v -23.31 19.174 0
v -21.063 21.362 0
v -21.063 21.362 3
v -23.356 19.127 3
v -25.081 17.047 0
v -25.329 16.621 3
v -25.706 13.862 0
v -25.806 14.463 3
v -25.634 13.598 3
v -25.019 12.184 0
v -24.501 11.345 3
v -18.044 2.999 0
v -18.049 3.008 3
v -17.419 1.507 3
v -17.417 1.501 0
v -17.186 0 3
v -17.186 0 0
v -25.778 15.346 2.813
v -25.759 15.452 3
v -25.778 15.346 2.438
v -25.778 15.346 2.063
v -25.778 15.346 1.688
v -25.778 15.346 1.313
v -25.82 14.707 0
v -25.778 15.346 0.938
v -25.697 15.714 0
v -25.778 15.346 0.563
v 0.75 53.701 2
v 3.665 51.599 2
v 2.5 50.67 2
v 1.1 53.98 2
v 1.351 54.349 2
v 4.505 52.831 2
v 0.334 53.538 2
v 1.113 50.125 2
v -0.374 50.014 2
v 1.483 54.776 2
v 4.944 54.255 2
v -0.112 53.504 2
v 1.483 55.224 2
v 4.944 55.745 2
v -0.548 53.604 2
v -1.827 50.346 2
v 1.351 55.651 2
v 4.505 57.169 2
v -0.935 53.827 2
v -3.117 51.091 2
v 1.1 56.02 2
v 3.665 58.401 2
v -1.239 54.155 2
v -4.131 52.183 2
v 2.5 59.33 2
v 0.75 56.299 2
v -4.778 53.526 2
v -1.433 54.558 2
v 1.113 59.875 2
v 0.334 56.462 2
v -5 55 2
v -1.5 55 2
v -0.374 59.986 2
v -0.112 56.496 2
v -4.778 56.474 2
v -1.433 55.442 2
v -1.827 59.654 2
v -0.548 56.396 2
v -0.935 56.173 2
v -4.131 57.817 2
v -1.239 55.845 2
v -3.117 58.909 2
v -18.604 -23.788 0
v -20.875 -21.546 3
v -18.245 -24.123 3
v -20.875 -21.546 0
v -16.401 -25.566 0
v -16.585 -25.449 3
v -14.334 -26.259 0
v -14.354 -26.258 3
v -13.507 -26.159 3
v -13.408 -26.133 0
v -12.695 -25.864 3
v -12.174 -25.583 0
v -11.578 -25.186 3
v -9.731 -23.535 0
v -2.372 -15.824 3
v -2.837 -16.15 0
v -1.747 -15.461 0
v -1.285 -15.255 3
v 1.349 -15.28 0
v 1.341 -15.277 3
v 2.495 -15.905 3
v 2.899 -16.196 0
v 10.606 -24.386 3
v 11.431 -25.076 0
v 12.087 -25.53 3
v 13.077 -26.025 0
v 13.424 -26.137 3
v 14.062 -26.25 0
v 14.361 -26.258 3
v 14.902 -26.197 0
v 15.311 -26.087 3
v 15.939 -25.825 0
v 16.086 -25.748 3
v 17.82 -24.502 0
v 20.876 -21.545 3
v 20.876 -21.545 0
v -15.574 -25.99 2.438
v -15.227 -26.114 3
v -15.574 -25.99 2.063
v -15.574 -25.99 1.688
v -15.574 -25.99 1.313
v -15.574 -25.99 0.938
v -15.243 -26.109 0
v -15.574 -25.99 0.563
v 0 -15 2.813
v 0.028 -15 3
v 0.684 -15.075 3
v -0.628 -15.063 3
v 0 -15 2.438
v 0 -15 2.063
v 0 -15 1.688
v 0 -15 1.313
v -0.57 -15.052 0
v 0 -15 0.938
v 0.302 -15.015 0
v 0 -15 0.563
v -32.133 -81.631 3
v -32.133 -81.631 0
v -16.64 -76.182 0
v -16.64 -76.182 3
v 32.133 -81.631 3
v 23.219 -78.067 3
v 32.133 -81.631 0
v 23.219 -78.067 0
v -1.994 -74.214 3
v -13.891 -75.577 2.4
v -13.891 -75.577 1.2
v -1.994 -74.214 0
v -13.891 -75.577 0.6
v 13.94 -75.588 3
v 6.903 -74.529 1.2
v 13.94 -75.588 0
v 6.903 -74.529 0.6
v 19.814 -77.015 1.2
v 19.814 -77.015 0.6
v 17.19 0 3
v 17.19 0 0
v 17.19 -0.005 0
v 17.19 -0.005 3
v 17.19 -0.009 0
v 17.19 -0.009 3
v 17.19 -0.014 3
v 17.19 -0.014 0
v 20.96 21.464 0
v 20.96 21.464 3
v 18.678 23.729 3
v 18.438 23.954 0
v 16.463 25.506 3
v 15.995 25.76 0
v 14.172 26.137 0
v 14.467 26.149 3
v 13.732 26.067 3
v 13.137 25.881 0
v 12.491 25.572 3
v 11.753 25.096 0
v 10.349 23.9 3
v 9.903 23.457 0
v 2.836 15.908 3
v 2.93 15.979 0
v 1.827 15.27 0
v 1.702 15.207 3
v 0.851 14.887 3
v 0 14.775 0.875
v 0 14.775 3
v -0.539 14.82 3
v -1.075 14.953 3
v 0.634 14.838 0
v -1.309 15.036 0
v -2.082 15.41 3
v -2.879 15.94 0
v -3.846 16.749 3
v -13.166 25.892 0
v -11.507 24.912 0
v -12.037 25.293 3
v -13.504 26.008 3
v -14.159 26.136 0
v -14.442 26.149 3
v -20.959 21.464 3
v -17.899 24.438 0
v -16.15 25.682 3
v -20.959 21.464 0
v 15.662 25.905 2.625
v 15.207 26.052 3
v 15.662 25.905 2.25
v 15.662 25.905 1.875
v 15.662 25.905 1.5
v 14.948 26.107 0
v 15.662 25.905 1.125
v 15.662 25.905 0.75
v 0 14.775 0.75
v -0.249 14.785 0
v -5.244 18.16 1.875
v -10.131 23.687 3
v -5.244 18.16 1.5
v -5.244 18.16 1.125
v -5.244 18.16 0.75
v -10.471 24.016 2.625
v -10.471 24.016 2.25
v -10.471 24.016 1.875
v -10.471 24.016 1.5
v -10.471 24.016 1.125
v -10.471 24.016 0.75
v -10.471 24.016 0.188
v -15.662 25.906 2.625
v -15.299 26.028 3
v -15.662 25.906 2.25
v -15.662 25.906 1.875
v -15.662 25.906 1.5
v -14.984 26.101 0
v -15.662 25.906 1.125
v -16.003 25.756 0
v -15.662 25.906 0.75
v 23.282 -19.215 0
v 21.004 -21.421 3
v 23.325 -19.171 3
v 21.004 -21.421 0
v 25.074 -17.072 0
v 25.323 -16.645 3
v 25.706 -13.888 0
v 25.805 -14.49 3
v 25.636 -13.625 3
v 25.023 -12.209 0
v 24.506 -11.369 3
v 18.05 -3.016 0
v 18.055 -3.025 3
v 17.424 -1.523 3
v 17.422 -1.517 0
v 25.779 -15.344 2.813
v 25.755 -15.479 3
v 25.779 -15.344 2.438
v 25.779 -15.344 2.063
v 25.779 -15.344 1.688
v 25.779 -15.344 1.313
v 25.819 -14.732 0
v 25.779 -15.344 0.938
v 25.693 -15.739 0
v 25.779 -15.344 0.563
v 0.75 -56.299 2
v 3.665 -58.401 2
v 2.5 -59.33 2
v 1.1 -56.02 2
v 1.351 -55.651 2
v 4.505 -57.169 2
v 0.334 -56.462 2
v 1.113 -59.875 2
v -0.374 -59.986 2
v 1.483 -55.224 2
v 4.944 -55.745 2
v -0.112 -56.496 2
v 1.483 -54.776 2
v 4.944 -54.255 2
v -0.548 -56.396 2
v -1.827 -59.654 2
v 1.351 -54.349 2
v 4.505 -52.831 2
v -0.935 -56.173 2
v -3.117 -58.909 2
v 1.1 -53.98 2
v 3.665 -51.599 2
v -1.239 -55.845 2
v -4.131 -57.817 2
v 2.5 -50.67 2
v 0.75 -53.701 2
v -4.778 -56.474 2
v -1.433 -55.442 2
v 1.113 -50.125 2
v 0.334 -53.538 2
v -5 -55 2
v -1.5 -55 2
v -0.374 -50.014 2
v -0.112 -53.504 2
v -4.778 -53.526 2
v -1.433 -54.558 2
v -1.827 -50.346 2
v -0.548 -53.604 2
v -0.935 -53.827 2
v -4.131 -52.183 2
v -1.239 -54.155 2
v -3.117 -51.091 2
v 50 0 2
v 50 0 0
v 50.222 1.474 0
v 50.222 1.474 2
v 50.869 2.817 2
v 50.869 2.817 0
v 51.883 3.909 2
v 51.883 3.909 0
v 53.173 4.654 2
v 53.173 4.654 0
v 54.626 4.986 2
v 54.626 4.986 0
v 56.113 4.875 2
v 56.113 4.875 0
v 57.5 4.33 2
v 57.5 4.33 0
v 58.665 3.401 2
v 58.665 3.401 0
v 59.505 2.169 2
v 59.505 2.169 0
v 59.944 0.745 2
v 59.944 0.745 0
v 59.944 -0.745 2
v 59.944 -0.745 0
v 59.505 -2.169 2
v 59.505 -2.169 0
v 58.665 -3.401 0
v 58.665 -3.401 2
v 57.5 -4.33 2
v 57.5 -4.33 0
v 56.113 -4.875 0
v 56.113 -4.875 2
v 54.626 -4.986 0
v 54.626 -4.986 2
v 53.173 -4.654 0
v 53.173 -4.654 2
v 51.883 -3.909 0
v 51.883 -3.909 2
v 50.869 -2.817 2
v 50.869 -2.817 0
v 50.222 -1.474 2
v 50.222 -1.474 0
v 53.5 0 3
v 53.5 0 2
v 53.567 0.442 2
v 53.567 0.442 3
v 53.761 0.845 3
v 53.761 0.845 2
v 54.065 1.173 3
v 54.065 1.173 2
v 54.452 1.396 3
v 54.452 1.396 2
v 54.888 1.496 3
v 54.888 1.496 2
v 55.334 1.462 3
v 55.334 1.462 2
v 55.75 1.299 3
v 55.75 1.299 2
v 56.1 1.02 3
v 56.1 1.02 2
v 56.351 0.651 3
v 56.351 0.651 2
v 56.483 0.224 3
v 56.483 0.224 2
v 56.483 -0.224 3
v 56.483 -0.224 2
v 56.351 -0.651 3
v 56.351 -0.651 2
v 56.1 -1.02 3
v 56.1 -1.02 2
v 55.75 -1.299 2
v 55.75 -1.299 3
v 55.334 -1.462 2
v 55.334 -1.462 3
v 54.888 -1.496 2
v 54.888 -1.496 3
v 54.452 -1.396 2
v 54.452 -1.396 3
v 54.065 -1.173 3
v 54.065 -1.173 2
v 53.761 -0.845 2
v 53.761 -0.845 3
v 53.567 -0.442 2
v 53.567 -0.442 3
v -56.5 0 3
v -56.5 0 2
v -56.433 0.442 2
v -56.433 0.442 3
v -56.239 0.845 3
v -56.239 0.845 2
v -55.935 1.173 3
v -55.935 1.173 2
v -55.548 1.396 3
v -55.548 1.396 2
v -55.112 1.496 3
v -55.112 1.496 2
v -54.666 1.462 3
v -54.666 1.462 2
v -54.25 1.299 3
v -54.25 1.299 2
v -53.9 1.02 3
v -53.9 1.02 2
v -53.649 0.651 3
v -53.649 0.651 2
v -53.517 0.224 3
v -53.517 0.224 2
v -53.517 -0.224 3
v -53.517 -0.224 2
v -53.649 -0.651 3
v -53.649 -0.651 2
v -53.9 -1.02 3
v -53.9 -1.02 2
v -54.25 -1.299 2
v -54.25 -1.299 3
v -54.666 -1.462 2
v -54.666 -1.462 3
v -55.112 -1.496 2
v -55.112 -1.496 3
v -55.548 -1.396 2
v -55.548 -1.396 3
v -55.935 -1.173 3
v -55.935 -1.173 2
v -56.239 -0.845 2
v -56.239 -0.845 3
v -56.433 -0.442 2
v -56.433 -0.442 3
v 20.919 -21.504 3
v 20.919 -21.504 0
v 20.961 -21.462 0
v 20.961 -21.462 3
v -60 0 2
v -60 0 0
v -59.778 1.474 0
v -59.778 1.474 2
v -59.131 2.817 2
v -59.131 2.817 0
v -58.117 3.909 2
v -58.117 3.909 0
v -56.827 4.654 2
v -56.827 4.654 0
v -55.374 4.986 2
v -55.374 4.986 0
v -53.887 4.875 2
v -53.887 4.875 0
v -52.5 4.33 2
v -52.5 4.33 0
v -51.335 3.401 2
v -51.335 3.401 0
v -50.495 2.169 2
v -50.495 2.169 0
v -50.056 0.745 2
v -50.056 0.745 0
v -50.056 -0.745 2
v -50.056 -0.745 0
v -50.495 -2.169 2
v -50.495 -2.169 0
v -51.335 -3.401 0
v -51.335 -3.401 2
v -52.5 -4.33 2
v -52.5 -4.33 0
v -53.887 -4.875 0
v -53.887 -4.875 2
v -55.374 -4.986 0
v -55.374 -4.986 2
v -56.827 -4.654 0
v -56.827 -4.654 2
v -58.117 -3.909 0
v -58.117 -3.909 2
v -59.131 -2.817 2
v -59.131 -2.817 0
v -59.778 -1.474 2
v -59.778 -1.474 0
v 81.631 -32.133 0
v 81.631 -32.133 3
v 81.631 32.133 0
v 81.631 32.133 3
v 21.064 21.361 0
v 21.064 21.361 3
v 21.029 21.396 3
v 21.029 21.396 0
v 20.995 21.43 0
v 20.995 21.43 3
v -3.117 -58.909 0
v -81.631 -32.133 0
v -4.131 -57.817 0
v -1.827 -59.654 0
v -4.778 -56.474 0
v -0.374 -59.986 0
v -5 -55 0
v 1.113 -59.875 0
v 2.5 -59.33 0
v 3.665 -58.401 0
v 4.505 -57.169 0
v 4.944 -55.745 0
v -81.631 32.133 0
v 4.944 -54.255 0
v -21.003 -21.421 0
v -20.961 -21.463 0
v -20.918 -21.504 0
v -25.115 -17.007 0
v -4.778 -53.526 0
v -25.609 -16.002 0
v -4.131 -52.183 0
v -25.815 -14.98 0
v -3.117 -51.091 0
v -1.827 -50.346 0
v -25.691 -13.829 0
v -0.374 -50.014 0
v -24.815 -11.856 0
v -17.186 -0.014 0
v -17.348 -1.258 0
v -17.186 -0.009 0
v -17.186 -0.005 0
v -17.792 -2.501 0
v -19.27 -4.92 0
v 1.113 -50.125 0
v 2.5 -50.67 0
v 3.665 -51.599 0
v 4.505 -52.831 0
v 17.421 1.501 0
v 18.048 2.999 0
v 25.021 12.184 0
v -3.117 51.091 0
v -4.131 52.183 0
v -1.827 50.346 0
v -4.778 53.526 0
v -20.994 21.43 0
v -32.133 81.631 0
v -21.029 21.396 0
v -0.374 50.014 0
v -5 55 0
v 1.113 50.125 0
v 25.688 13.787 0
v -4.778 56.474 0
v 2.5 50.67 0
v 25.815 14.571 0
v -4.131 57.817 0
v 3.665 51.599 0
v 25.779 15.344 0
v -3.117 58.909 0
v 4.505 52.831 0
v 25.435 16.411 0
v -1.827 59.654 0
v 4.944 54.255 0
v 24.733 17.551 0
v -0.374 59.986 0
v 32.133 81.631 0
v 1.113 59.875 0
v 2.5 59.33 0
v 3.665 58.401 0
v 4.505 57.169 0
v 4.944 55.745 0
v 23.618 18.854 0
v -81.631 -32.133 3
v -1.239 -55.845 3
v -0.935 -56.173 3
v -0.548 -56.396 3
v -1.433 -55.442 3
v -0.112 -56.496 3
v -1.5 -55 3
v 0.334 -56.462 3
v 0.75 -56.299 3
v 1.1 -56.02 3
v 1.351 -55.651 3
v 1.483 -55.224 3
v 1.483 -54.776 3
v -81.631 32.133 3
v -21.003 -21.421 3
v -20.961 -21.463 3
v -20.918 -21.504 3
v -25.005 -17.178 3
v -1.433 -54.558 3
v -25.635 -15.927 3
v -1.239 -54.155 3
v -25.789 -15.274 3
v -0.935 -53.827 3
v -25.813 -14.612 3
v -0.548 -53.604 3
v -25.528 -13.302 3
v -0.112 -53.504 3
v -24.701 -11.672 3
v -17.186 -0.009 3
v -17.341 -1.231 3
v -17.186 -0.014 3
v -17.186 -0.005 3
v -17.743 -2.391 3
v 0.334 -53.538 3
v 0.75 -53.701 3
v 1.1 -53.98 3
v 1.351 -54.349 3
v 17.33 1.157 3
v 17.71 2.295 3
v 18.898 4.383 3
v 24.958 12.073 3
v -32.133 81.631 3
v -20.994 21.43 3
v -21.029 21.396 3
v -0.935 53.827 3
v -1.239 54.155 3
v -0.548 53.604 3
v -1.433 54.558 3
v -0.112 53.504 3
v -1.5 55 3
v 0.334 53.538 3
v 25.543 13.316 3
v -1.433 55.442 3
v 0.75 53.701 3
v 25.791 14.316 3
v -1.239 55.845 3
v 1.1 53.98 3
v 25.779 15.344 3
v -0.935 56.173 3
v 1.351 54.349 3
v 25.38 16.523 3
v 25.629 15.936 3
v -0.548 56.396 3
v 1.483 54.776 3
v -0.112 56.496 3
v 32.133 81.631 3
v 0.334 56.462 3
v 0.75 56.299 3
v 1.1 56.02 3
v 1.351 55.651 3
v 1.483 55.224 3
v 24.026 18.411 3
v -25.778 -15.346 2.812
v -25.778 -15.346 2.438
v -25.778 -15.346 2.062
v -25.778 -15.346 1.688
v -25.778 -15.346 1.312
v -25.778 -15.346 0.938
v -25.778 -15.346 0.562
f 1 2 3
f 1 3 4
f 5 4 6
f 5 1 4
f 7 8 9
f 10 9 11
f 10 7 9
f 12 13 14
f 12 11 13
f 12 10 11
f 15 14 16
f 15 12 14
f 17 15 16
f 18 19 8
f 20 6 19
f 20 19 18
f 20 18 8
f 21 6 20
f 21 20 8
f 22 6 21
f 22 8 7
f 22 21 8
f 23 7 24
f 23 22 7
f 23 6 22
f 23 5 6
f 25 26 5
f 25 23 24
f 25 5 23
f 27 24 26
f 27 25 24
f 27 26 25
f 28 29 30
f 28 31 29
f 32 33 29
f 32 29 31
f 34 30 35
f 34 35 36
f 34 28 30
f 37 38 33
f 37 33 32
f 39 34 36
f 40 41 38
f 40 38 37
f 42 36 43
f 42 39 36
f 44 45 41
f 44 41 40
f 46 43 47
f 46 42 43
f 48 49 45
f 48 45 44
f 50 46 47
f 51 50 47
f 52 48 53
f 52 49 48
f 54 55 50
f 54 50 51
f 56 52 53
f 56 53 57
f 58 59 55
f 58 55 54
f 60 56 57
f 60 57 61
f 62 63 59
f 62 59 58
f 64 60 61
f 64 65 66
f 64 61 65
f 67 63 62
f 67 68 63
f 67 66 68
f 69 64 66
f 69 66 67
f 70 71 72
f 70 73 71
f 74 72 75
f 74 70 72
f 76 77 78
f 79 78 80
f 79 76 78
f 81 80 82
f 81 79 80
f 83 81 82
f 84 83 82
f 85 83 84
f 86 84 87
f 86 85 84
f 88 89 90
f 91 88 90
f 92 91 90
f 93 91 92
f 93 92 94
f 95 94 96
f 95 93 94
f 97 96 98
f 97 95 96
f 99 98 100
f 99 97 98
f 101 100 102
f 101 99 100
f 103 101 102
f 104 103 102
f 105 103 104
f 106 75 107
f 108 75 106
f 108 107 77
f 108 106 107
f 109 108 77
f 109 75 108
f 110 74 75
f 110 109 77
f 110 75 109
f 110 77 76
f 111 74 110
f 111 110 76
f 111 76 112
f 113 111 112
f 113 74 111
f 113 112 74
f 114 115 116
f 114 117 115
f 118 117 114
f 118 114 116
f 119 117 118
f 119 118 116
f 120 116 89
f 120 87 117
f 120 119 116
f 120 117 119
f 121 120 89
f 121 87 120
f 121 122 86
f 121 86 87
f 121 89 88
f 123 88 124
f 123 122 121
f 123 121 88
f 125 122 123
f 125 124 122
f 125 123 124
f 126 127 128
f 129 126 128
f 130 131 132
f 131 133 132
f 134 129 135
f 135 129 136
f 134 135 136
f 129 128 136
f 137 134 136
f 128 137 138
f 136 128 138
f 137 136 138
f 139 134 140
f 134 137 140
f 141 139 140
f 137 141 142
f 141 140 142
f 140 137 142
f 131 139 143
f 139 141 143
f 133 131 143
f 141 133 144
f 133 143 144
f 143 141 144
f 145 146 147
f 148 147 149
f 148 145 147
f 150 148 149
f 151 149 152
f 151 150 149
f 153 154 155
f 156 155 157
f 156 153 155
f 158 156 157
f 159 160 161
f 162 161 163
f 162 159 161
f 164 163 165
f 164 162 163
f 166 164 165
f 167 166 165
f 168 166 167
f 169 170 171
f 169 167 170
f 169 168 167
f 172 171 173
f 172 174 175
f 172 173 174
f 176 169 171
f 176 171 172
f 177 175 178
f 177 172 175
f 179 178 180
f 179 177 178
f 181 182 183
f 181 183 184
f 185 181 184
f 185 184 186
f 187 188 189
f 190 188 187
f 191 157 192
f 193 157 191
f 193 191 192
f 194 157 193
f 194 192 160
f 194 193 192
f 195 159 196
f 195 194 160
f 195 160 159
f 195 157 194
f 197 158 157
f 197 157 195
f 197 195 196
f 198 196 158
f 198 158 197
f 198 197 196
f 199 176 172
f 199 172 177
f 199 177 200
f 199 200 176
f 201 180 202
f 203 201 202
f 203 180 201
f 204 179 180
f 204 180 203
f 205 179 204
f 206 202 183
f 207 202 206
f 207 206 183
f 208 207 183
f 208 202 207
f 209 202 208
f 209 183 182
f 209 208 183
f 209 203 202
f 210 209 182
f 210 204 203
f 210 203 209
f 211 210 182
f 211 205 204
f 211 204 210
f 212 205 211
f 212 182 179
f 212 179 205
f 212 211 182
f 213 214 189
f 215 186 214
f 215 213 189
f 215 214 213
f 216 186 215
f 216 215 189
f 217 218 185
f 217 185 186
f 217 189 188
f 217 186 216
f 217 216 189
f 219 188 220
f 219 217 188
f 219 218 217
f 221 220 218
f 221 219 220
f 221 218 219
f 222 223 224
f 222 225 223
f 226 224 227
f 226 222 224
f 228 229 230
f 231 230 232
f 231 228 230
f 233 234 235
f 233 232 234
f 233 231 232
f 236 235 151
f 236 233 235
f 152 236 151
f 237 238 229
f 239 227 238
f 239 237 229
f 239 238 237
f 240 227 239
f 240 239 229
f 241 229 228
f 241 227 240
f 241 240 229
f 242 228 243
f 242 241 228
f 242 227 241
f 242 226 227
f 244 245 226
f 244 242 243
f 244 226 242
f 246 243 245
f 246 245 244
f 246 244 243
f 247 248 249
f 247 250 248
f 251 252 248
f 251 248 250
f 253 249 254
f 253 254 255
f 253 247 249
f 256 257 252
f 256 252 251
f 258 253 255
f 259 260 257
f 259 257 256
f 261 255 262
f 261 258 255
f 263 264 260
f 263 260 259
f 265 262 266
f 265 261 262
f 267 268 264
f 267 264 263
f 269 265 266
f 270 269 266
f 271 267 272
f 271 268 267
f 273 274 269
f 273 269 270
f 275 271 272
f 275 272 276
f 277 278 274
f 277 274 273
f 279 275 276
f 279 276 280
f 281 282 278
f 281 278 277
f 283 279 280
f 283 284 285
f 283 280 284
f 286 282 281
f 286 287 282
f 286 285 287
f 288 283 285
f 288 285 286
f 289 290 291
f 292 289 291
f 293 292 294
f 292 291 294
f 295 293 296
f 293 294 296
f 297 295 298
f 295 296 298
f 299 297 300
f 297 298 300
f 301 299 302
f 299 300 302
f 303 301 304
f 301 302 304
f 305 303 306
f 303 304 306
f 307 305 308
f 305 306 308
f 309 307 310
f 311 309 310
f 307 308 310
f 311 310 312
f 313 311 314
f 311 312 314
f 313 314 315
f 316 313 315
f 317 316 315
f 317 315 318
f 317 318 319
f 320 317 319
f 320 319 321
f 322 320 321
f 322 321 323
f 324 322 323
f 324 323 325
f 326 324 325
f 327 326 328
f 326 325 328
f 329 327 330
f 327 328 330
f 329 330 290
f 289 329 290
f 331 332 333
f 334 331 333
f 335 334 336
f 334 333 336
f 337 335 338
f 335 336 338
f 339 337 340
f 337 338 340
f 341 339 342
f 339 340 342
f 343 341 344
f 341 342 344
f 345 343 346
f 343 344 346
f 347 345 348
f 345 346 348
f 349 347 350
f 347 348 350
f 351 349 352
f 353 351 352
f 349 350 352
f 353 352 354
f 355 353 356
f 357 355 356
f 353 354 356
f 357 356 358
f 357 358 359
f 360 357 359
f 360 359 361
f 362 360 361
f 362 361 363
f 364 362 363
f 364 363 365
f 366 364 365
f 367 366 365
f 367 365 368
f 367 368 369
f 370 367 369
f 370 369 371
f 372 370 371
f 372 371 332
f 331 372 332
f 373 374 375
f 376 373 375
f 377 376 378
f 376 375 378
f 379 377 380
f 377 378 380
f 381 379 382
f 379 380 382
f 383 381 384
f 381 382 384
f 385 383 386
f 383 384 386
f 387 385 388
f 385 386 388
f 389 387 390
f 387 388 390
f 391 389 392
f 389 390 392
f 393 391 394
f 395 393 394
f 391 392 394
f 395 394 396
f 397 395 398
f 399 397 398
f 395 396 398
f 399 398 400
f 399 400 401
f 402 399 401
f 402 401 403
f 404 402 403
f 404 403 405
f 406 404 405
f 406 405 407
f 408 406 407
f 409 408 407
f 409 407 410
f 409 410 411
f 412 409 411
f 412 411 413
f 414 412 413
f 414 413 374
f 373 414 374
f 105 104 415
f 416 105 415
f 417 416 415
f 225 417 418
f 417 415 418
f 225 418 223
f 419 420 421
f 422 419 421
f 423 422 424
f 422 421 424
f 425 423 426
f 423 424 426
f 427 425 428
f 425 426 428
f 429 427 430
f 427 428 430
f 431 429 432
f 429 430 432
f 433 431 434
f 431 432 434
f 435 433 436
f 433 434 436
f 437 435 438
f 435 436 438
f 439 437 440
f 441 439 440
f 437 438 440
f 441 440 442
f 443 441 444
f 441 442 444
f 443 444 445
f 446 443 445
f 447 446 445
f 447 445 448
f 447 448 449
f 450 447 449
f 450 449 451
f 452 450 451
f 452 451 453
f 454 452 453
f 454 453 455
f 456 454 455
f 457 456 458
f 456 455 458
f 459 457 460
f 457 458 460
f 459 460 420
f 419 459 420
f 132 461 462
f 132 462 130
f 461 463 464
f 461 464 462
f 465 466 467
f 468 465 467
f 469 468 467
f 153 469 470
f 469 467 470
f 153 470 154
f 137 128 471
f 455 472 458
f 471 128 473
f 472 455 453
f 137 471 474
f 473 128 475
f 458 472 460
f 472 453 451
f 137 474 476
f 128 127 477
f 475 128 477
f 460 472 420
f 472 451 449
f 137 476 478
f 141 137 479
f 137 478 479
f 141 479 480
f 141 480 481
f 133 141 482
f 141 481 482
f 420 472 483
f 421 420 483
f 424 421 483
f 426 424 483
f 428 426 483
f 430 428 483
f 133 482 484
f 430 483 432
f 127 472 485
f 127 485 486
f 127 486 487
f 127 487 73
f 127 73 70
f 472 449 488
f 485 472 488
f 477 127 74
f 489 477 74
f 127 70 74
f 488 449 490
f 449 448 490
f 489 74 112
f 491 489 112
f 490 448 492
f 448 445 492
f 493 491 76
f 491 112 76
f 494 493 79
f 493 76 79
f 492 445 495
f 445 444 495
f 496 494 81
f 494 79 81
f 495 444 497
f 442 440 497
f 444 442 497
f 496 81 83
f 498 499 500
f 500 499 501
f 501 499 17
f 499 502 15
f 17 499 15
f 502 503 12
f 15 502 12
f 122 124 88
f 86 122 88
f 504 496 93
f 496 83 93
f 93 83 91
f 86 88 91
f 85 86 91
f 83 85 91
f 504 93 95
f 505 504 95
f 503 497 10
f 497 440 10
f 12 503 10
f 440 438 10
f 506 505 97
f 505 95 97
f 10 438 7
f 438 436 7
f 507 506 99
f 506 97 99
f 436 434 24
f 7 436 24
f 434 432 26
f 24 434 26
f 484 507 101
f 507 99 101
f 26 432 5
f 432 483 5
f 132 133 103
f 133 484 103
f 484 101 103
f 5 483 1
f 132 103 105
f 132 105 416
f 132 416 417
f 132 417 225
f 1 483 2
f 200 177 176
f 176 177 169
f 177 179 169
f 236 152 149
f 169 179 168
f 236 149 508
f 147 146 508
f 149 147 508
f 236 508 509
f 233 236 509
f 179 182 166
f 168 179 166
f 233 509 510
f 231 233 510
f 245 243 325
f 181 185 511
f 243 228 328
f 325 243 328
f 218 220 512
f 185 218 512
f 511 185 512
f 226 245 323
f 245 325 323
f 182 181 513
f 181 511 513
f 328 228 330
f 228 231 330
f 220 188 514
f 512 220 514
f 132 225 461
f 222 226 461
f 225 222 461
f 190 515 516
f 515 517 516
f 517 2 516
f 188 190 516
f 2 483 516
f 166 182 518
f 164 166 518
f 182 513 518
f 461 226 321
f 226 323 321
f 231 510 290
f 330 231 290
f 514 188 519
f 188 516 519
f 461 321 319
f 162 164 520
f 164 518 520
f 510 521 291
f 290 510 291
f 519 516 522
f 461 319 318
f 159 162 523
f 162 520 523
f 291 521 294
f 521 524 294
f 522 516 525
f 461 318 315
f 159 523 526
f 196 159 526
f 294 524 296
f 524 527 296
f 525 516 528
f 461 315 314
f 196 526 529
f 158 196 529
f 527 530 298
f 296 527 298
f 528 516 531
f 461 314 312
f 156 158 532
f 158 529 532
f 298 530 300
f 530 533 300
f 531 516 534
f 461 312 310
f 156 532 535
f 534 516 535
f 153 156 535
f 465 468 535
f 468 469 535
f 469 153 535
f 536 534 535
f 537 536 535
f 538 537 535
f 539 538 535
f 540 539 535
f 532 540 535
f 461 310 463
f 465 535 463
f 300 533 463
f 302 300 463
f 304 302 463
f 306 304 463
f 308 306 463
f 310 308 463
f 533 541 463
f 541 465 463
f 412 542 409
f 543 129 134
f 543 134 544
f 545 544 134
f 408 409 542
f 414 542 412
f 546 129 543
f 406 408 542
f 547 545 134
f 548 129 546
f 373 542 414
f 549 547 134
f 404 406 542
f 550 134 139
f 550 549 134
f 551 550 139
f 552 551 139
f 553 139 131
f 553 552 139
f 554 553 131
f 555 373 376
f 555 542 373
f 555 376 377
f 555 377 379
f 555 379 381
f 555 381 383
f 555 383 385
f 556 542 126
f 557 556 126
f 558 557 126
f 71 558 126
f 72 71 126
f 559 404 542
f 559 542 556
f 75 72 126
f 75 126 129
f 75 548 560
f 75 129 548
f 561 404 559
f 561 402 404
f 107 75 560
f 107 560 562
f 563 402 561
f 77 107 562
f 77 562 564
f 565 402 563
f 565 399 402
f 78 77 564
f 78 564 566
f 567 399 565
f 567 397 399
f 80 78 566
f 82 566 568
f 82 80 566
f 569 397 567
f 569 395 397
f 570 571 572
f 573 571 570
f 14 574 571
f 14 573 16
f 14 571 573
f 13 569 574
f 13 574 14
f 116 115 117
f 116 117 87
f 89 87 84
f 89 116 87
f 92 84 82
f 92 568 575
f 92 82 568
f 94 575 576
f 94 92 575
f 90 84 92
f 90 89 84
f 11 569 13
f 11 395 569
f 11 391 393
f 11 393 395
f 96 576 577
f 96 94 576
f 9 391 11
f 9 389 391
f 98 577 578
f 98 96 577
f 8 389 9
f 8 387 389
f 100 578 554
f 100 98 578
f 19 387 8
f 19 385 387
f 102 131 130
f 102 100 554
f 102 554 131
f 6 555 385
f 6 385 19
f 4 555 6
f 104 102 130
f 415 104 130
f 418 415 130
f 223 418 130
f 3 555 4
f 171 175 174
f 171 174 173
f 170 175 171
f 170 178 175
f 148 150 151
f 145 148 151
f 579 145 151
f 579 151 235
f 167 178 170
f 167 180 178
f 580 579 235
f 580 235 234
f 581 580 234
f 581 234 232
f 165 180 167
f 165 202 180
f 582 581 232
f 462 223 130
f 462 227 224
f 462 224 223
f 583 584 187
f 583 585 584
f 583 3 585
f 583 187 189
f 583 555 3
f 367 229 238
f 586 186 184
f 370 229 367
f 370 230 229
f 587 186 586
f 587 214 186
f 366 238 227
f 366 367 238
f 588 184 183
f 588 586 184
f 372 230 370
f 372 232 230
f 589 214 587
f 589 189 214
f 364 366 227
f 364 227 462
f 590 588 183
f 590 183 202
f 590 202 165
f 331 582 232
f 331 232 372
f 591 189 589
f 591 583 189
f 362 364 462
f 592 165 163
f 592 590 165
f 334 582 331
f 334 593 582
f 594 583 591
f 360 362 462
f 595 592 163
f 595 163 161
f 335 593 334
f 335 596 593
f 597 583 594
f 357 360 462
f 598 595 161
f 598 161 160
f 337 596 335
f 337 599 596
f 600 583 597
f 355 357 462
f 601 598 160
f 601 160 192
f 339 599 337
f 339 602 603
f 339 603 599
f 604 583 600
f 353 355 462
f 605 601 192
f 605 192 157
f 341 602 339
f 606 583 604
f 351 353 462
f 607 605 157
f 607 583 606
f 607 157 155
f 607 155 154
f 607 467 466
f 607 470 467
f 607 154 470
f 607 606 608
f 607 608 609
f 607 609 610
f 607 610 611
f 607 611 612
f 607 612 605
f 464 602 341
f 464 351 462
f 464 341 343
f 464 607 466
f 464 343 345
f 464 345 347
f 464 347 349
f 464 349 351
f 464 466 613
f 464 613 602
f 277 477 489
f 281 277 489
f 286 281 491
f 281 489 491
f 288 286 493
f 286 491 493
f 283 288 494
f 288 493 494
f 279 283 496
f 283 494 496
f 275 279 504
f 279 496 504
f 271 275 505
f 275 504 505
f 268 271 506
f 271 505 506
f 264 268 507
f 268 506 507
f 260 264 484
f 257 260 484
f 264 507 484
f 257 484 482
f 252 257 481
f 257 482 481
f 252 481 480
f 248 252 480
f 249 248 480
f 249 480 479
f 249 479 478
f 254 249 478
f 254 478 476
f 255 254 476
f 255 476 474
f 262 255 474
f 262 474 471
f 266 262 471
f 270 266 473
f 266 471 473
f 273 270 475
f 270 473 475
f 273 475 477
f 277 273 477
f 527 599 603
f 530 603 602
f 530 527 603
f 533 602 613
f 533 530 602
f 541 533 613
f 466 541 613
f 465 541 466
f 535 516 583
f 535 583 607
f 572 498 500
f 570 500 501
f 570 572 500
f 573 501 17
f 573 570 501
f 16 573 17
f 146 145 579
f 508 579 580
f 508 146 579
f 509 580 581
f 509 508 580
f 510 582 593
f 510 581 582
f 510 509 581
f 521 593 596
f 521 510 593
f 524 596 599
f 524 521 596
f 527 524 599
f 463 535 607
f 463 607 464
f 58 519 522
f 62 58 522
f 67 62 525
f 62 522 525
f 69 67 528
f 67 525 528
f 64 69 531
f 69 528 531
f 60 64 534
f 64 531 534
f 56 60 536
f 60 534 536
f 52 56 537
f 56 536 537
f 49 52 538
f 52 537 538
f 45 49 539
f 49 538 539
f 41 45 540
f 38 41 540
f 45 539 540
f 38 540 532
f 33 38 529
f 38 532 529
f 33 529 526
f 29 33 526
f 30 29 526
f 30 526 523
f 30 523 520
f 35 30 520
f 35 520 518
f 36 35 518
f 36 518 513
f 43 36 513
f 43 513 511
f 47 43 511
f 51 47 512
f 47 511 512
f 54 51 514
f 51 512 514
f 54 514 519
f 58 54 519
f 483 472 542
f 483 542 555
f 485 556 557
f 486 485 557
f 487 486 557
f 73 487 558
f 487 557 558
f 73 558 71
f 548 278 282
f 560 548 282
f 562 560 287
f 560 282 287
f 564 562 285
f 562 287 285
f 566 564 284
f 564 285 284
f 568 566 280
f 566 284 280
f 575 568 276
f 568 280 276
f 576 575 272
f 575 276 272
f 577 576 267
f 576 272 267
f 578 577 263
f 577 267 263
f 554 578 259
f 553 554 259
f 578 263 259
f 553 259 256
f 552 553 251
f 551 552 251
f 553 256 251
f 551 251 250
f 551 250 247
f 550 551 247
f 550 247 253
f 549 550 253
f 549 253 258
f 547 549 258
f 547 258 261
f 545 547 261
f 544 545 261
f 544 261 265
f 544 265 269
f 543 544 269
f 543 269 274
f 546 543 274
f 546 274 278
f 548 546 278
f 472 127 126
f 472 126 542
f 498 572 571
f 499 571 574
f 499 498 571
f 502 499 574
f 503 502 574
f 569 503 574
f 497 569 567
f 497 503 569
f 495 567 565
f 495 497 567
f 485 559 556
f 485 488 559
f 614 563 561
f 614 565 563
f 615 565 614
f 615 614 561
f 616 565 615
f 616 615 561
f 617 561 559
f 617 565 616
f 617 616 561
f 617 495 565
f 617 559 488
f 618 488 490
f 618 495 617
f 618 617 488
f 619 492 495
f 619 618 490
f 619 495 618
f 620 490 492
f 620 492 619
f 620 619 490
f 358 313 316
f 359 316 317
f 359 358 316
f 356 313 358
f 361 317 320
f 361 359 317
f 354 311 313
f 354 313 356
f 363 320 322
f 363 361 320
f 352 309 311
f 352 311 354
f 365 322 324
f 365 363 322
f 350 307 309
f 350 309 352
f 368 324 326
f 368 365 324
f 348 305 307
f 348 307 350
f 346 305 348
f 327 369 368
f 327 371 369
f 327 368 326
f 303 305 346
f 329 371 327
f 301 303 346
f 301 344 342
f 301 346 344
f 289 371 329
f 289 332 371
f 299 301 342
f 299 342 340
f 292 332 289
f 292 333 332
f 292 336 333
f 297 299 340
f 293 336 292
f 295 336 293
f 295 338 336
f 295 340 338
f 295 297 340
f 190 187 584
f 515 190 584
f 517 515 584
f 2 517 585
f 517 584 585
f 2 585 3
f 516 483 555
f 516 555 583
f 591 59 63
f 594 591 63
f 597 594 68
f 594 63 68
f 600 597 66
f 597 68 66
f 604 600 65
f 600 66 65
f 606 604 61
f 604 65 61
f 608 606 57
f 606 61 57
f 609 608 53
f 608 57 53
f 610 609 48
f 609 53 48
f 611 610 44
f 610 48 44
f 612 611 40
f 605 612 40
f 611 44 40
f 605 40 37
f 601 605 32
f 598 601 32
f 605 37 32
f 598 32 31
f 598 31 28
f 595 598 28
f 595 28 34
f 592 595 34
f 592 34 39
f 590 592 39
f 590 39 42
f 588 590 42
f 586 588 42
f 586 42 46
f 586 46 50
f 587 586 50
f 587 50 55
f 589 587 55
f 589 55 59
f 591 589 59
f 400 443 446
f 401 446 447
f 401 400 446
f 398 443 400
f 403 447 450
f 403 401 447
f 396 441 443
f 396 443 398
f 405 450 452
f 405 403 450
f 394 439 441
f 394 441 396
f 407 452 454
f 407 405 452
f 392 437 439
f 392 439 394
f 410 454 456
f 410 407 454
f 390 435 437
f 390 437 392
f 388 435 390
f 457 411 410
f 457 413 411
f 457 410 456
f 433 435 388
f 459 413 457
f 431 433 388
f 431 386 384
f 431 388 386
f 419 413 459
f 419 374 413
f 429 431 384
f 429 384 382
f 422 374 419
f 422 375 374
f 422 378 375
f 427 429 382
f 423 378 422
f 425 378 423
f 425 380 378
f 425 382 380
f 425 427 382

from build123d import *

# Parameters (mm, degrees)
BOSS_EXTRUDE1_DEPTH  = 3
SKETCH2_R            = 1.5
CUT_EXTRUDE1_DEPTH   = 3
SKETCH3_R            = 30
SKETCH3_R_2          = 15
CUT_EXTRUDE2_DEPTH   = 3
SKETCH4_R            = 18
BOSS_EXTRUDE6_DEPTH  = 3
SKETCH5_R            = 15
BOSS_EXTRUDE7_DEPTH  = 3
SKETCH6_R            = 15.225419419
BOSS_EXTRUDE8_DEPTH  = 3
SKETCH7_R            = 1.5
CUT_EXTRUDE4_DEPTH   = 3
SKETCH9_R            = 10
CUT_EXTRUDE5_DEPTH   = 3
SKETCH10_R           = 19.155501788
BOSS_EXTRUDE9_DEPTH  = 3
SKETCH11_R           = 13.756788871
BOSS_EXTRUDE10_DEPTH = 3
SKETCH12_R           = 11.549228796
BOSS_EXTRUDE11_DEPTH = 3
SKETCH14_R           = 9.610550559
BOSS_EXTRUDE12_DEPTH = 3
SKETCH15_R           = 14.086691916
BOSS_EXTRUDE13_DEPTH = 3
SKETCH16_R           = 15.543730799
BOSS_EXTRUDE14_DEPTH = 3
SKETCH17_R           = 14.681473261
BOSS_EXTRUDE17_DEPTH = 3
SKETCH18_R           = 13.614072274
BOSS_EXTRUDE18_DEPTH = 3
SKETCH19_R           = 1.5
CUT_EXTRUDE6_DEPTH   = 10
SKETCH20_R           = 5
CUT_EXTRUDE8_DEPTH   = 2
CUT_EXTRUDE11_DEPTH  = 14


with BuildPart() as part:
    # Sketch1 → Boss-Extrude1 (new body)
    with BuildSketch(Plane.XY):
        with BuildLine():
            Line((-32.133468612, 81.630943295), (32.133468612, 81.630943295))
            Line((32.133468612, 81.630943295), (81.630943295, 32.133468612))
            Line((81.630943295, 32.133468612), (81.630943295, -32.133468612))
            Line((81.630943295, -32.133468612), (32.133468612, -81.630943295))
            add(Edge.make_bspline(
                [(-32.133468612, -81.630943295), (-26.315604905, -78.929469601), (-17.458466972, -75.90692924), (-6.459846686, -74.366971031), (0.503945588, -74.095540146), (13.381410653, -74.737409183), (24.194527132, -77.919288079), (32.133468612, -81.630943295)],
                knots=[0, 0, 0, 0, 0.289771888, 0.418866631, 0.500125988, 0.604148798, 1, 1, 1, 1], degree=3))
            Line((-32.133468612, -81.630943295), (-81.630943295, -32.133468612))
            Line((-81.630943295, -32.133468612), (-81.630943295, 32.133468612))
            Line((-81.630943295, 32.133468612), (-32.133468612, 81.630943295))
        make_face()
    extrude(amount=BOSS_EXTRUDE1_DEPTH)

    # Sketch2 → Cut-Extrude1 (cut)
    with BuildSketch(Plane.XY.offset(3)):
        with Locations((-39.204536424, -39.204536424)):
            Circle(SKETCH2_R)
        with Locations((39.204536424, -39.204536424)):
            Circle(SKETCH2_R)
        with Locations((39.204536424, 39.204536424)):
            Circle(SKETCH2_R)
        with Locations((-39.204536424, 39.204536424)):
            Circle(SKETCH2_R)
    extrude(amount=-CUT_EXTRUDE1_DEPTH, mode=Mode.SUBTRACT)

    # Sketch3 → Cut-Extrude2 (cut)
    with BuildSketch(Plane.XY.offset(3)):
        Circle(SKETCH3_R)
        with Locations((0, 30)):
            Circle(SKETCH3_R_2)
        Circle(SKETCH3_R)
        with Locations((0, 30)):
            Circle(SKETCH3_R_2)
        with Locations((0, -30)):
            Circle(SKETCH3_R_2)
        Circle(SKETCH3_R)
        with Locations((30, 0)):
            Circle(SKETCH3_R_2)
        with Locations((0, 30)):
            Circle(SKETCH3_R_2)
        with Locations((-30, 0)):
            Circle(SKETCH3_R_2)
        Circle(SKETCH3_R)
        with Locations((-30, 0)):
            Circle(SKETCH3_R_2)
        Circle(SKETCH3_R)
        with Locations((0, -30)):
            Circle(SKETCH3_R_2)
        Circle(SKETCH3_R)
        with Locations((30, 0)):
            Circle(SKETCH3_R_2)
        Circle(SKETCH3_R)
        with Locations((30, 0)):
            Circle(SKETCH3_R_2)
        Circle(SKETCH3_R)
        with Locations((0, -30)):
            Circle(SKETCH3_R_2)
        Circle(SKETCH3_R)
        with Locations((-30, 0)):
            Circle(SKETCH3_R_2)
    extrude(amount=-CUT_EXTRUDE2_DEPTH, mode=Mode.SUBTRACT)

    # Sketch4 → Boss-Extrude6 (add)
    with BuildSketch(Plane.XY.offset(3)):
        with Locations((-35.186247216, 0)):
            Circle(SKETCH4_R)
        with Locations((35.19, 0)):
            Circle(SKETCH4_R)
    extrude(amount=-BOSS_EXTRUDE6_DEPTH)

    # Sketch5 → Boss-Extrude7 (add)
    with BuildSketch(Plane.XY.offset(3)):
        with Locations((0, -30)):
            Circle(SKETCH5_R)
    extrude(amount=-BOSS_EXTRUDE7_DEPTH)

    # Sketch6 → Boss-Extrude8 (add)
    with BuildSketch(Plane.XY.offset(3)):
        with Locations((0, 30)):
            Circle(SKETCH6_R)
    extrude(amount=-BOSS_EXTRUDE8_DEPTH)

    # Sketch7 → Cut-Extrude4 (cut)
    with BuildSketch(Plane.XY.offset(3)):
        with Locations((-46.253324199, 32.134700114)):
            Circle(SKETCH7_R)
        with Locations((-52.103605786, -20.865299886)):
            Circle(SKETCH7_R)
        with Locations((34.896394214, -20.865299886)):
            Circle(SKETCH7_R)
        with Locations((34.896394214, 32.134700114)):
            Circle(SKETCH7_R)
    extrude(amount=-CUT_EXTRUDE4_DEPTH, mode=Mode.SUBTRACT)

    # Sketch9 → Cut-Extrude5 (cut)
    with BuildSketch(Plane.XY.offset(3)):
        with Locations((0, 65.004511024)):
            Circle(SKETCH9_R)
        with Locations((0, -51.773637368)):
            Circle(SKETCH9_R)
        with Locations((-62.186247216, 0)):
            Circle(SKETCH9_R)
        with Locations((62.19, 0)):
            Circle(SKETCH9_R)
    extrude(amount=-CUT_EXTRUDE5_DEPTH, mode=Mode.SUBTRACT)

    # Sketch10 → Boss-Extrude9 (add)
    with BuildSketch(Plane.XY.offset(3)):
        with Locations((-48.672279754, -29.553895966)):
            Circle(SKETCH10_R)
    extrude(amount=-BOSS_EXTRUDE9_DEPTH)

    # Sketch11 → Boss-Extrude10 (add)
    with BuildSketch(Plane.XY.offset(3)):
        with Locations((37.212476286, -30.975829013)):
            Circle(SKETCH11_R)
    extrude(amount=-BOSS_EXTRUDE10_DEPTH)

    # Sketch12 → Boss-Extrude11 (add)
    with BuildSketch(Plane.XY.offset(3)):
        with Locations((38.591163572, 36.494236376)):
            Circle(SKETCH12_R)
    extrude(amount=-BOSS_EXTRUDE11_DEPTH)

    # Sketch14 → Boss-Extrude12 (add)
    with BuildSketch(Plane.XY.offset(3)):
        with Locations((-42.212724403, 37.609741157)):
            Circle(SKETCH14_R)
    extrude(amount=-BOSS_EXTRUDE12_DEPTH)

    # Sketch15 → Boss-Extrude13 (add)
    with BuildSketch(Plane.XY.offset(3)):
        with Locations((0, -51.773637368)):
            Circle(SKETCH15_R)
    extrude(amount=-BOSS_EXTRUDE13_DEPTH)

    # Sketch16 → Boss-Extrude14 (add)
    with BuildSketch(Plane.XY.offset(3)):
        with Locations((-63.76815814, 0)):
            Circle(SKETCH16_R)
    extrude(amount=-BOSS_EXTRUDE14_DEPTH)

    # Sketch17 → Boss-Extrude17 (add)
    with BuildSketch(Plane.XY.offset(3)):
        with Locations((-0.058768436, 63.845084824)):
            Circle(SKETCH17_R)
    extrude(amount=-BOSS_EXTRUDE17_DEPTH)

    # Sketch18 → Boss-Extrude18 (add)
    with BuildSketch(Plane(origin=(0, 0, 0), x_dir=(-1, 0, 0), z_dir=(0, 0, -1))):
        with Locations((-63.543622385, 0)):
            Circle(SKETCH18_R)
    extrude(amount=-BOSS_EXTRUDE18_DEPTH)

    # Sketch19 → Cut-Extrude6 (cut)
    with BuildSketch(Plane(origin=(0, 0, 0), x_dir=(-1, 0, 0), z_dir=(0, 0, -1))):
        with Locations((0, 55)):
            Circle(SKETCH19_R)
        with Locations((55, 0)):
            Circle(SKETCH19_R)
        with Locations((0, -55)):
            Circle(SKETCH19_R)
        with Locations((-55, 0)):
            Circle(SKETCH19_R)
    extrude(amount=-CUT_EXTRUDE6_DEPTH, mode=Mode.SUBTRACT)

    # Sketch20 → Cut-Extrude8 (cut)
    with BuildSketch(Plane(origin=(0, 0, 0), x_dir=(-1, 0, 0), z_dir=(0, 0, -1))):
        with Locations((0, 55)):
            Circle(SKETCH20_R)
        with Locations((55, 0)):
            Circle(SKETCH20_R)
        with Locations((0, -55)):
            Circle(SKETCH20_R)
        with Locations((-55, 0)):
            Circle(SKETCH20_R)
    extrude(amount=-CUT_EXTRUDE8_DEPTH, mode=Mode.SUBTRACT)

    # Sketch21 → Cut-Extrude11 (cut)
    with BuildSketch(Plane(origin=(0, 0, 0), x_dir=(-1, 0, 0), z_dir=(0, 0, -1))):
        with BuildLine():
            add(Edge.make_bspline(
                [(-25.779143223, 15.343916538), (-25.444782602, 17.404426932), (-20.814862678, 21.253079788), (-11.928002545, 31.54538853), (1.317e-05, 2.953987482), (11.927707302, 31.545045431), (20.814157023, 21.253821997), (30.670361401, 13.0612405), (7.851072174, 0.001919986), (30.702175927, -13.101903603), (20.72807921, -21.32903317), (11.794640134, -31.622543771), (1.2848e-05, -3.377971787), (-11.794933778, -31.622888023), (-20.72878866, -21.328293053), (-30.702340419, -13.101151105), (-7.858122441, 0.001919089), (-26.533922641, 10.69255887), (-25.779143223, 15.343916538)],
                knots=[0, 0, 0, 0, 0.037620183, 0.075240365, 0.165070914, 0.254901463, 0.292516948, 0.330132434, 0.415069121, 0.500005809, 0.538178927, 0.576352045, 0.665075111, 0.753798177, 0.791975991, 0.830153805, 0.915076903, 1, 1, 1, 1], degree=3))
        make_face()
    extrude(amount=-CUT_EXTRUDE11_DEPTH, mode=Mode.SUBTRACT)


solid = part.part
